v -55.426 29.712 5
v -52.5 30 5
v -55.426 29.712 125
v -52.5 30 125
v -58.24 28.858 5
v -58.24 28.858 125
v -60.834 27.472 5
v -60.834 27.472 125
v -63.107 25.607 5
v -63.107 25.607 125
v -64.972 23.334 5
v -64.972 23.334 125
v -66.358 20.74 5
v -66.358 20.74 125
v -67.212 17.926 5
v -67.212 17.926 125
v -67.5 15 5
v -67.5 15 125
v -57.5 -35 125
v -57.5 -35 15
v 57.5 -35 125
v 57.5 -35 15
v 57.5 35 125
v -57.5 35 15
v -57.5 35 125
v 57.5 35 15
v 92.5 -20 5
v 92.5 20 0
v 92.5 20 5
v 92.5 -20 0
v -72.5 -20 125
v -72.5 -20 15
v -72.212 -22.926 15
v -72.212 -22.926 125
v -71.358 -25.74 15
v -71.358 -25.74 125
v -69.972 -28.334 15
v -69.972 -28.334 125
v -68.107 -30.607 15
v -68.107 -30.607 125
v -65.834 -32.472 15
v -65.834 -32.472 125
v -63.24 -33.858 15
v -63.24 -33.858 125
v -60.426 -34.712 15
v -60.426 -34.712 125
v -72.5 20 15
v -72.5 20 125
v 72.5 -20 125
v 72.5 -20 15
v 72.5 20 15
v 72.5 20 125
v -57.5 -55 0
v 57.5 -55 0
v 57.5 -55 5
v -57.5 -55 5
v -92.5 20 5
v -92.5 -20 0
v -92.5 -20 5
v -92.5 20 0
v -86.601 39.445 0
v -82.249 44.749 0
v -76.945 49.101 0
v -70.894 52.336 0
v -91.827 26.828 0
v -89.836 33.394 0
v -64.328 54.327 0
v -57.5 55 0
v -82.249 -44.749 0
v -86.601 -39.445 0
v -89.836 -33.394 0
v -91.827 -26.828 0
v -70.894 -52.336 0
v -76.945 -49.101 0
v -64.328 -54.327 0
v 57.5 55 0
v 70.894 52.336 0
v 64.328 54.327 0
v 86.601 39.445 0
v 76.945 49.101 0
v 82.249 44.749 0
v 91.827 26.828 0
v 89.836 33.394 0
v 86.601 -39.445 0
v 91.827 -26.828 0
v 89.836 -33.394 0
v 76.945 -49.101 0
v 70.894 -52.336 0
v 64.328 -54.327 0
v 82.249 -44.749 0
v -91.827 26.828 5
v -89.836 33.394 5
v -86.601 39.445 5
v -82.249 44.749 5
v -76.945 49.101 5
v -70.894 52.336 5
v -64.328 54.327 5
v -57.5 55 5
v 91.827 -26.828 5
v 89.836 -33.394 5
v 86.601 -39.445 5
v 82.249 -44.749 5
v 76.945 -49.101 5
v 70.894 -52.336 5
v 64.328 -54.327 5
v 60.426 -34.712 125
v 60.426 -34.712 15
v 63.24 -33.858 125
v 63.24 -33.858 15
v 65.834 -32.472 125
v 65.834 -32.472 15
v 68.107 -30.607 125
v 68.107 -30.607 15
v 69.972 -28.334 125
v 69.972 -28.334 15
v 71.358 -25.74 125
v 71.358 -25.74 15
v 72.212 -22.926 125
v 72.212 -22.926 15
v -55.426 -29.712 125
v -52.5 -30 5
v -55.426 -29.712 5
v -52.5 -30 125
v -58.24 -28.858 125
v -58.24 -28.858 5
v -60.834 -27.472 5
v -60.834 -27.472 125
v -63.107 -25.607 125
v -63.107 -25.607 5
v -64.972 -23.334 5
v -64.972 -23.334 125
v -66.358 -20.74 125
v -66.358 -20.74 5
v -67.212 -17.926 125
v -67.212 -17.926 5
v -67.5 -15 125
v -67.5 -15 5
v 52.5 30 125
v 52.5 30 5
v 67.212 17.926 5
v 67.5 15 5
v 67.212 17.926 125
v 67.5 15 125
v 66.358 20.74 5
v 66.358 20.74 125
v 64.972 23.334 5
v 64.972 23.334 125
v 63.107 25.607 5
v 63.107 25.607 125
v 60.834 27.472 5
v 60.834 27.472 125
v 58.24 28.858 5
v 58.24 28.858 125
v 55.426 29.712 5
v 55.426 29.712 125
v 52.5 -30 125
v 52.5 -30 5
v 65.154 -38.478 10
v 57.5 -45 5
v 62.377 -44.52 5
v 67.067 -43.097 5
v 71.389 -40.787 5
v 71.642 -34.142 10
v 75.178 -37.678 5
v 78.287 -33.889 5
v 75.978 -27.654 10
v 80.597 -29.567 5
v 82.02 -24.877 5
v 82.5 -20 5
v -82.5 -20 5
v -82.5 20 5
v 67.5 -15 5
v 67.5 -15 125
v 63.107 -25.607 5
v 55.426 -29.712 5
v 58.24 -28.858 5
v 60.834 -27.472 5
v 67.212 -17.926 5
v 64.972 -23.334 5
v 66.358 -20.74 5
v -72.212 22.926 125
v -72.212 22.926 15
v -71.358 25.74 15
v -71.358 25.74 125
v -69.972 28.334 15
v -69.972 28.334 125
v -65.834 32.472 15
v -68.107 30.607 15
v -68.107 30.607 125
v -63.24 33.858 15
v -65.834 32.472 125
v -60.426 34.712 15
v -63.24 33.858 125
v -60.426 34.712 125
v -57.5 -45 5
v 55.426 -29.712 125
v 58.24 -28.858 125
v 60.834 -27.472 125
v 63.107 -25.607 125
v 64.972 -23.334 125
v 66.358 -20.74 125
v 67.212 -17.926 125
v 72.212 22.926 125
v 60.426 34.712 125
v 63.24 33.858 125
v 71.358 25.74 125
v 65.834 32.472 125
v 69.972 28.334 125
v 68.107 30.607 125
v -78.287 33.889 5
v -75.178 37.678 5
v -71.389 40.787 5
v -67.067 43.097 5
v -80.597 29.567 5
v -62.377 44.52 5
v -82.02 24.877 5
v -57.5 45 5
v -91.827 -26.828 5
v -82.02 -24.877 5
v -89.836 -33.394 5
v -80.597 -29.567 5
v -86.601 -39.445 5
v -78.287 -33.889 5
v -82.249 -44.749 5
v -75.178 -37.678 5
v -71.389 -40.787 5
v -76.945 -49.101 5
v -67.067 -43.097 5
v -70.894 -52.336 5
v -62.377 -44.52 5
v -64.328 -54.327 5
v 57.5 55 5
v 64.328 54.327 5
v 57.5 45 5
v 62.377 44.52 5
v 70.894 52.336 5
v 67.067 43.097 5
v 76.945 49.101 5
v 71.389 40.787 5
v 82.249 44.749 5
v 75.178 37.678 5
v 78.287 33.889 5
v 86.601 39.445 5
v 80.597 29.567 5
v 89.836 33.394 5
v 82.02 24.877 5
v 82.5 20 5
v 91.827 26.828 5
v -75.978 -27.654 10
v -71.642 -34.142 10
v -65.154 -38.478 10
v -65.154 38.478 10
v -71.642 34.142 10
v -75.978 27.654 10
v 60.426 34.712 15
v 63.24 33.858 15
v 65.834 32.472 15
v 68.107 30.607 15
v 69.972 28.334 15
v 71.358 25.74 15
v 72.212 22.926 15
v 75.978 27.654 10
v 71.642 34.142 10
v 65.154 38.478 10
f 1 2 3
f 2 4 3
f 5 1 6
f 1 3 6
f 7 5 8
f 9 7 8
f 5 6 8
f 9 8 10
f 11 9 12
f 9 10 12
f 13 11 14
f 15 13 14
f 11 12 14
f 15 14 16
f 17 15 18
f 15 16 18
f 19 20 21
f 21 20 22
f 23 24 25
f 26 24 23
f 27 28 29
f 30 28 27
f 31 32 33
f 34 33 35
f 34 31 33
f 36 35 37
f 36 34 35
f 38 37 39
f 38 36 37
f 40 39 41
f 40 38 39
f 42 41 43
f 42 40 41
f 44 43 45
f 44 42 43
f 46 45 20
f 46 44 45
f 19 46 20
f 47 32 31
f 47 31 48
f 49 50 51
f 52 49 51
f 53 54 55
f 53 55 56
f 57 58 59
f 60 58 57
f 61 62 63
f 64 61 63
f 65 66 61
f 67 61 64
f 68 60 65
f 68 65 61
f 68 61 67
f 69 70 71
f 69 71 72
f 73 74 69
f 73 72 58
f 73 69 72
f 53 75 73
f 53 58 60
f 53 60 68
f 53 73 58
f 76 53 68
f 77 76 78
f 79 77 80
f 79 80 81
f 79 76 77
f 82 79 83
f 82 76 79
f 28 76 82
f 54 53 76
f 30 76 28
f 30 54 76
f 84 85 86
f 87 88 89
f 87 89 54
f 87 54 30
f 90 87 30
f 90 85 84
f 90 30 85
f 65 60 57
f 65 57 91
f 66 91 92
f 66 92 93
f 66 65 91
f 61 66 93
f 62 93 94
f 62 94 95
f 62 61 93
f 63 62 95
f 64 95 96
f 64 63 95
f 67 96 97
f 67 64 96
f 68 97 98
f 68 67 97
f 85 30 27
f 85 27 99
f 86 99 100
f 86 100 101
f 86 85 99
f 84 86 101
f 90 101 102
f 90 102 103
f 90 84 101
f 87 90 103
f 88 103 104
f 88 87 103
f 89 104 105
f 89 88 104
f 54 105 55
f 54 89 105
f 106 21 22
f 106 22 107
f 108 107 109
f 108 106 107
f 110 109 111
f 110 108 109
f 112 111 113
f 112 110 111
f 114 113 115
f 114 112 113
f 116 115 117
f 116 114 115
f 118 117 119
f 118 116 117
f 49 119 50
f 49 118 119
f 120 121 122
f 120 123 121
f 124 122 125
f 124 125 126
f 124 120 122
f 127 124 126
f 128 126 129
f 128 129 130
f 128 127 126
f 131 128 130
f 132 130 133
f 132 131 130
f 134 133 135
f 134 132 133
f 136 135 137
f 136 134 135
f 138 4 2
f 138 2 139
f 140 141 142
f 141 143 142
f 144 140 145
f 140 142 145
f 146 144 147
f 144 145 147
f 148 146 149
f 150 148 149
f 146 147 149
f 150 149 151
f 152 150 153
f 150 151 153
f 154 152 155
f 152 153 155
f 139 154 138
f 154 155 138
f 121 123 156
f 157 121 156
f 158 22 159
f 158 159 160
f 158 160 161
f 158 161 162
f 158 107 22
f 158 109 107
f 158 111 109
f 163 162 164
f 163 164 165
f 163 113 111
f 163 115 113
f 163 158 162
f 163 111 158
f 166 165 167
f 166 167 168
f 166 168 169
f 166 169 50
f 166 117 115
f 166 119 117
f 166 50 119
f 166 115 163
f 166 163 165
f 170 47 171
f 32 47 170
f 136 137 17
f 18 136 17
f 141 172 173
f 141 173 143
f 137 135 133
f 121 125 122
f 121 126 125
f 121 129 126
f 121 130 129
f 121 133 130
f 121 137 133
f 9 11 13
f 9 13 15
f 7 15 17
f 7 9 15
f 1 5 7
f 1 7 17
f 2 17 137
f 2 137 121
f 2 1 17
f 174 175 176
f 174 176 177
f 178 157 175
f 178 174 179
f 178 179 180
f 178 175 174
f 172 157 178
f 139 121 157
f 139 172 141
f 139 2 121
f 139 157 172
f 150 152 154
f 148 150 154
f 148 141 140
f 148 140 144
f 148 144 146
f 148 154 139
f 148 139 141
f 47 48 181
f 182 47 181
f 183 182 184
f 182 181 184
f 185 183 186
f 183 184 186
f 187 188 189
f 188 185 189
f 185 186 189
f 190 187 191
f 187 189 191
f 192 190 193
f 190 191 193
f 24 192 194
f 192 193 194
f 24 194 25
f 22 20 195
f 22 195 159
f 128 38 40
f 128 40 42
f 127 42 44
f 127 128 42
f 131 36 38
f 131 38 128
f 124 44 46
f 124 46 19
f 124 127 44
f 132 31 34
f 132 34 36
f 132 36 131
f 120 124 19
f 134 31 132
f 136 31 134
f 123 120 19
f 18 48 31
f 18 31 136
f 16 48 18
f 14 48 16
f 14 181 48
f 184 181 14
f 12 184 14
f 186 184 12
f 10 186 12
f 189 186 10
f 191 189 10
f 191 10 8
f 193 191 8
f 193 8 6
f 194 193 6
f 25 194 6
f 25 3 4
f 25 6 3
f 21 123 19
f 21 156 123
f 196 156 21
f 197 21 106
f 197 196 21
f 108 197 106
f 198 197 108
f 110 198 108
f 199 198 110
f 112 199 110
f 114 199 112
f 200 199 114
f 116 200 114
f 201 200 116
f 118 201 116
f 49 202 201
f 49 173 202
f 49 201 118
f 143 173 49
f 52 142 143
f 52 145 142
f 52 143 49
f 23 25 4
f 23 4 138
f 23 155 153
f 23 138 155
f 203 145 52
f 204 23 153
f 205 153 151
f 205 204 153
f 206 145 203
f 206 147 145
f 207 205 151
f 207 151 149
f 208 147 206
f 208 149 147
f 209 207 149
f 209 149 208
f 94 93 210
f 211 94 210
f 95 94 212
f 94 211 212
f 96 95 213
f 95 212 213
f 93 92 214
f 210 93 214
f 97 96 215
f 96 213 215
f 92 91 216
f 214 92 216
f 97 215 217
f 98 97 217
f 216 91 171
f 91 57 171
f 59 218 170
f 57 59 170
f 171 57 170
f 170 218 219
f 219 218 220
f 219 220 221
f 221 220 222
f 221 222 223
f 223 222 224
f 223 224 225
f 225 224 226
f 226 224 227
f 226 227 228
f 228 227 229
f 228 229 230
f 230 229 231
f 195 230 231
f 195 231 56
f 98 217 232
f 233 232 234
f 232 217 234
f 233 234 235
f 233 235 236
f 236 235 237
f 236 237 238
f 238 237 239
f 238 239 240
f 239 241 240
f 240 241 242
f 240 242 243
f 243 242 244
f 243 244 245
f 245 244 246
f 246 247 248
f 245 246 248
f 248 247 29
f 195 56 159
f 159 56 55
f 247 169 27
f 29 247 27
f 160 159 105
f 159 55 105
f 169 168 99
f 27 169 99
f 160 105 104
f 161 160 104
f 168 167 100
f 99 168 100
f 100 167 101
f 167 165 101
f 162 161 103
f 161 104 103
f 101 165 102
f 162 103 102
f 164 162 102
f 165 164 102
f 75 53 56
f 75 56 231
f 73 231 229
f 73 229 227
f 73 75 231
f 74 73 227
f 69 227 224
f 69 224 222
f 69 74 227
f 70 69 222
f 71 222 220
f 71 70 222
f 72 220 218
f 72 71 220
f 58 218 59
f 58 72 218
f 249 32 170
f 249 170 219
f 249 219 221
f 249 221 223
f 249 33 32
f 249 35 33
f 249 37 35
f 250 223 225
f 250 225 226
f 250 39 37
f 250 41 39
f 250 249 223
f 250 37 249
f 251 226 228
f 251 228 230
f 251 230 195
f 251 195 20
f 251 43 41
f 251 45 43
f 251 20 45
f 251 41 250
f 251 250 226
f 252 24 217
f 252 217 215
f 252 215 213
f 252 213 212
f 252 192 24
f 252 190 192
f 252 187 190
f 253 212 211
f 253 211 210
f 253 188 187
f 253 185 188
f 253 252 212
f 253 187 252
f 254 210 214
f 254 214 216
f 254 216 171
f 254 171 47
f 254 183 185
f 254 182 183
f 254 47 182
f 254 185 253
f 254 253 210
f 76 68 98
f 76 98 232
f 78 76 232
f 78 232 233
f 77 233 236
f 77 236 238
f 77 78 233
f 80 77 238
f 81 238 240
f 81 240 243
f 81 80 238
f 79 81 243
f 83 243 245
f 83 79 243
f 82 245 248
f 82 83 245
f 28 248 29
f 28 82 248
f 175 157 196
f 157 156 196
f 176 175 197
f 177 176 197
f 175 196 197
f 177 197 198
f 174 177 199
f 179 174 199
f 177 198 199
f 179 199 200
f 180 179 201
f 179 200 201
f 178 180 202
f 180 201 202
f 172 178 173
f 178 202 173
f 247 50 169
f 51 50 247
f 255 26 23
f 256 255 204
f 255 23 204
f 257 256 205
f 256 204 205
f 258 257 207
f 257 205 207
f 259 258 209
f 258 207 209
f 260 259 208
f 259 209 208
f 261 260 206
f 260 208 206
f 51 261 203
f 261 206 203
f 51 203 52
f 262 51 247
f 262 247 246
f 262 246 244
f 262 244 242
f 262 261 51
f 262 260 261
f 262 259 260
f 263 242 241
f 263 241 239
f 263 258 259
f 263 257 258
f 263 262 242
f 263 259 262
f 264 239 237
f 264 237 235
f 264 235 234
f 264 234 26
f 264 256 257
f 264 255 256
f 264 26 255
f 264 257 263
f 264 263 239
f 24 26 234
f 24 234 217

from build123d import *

# Parameters (mm, degrees)
F0_W     = 145
F0_H     = 70
F0_W_2   = 135
F0_H_2   = 60
F1_DEPTH = 125
F2_DEPTH = 5
F3_R     = 15
F5_DEPTH = 5
F6_SIZE  = 10


with BuildPart() as f1:
    # F0 (on Top) → F1 (new body)
    with BuildSketch(Plane.XY):
        Rectangle(F0_W, F0_H)
        Rectangle(F0_W_2, F0_H_2, mode=Mode.SUBTRACT)
    extrude(amount=F1_DEPTH)

    # F0 (on Top) → F2 (join)
    with BuildSketch(Plane.XY):
        Rectangle(F0_W_2, F0_H_2)
    extrude(amount=F2_DEPTH)

    # F3
    f3_edges = [f1.edges().sort_by_distance(p)[0] for p in [
        (-72.5, 35, 62.5),
        (-67.5, 30, 65),
        (-67.5, -30, 65),
        (-72.5, -35, 62.5),
        (72.5, -35, 62.5),
        (67.5, -30, 65),
        (67.5, 30, 65),
        (72.5, 35, 62.5),
    ]]
    fillet(f3_edges, radius=F3_R)

    # F4 (on face) → F5 (join)
    with BuildSketch(Plane(origin=(0, 0, 0), x_dir=(1, 0, 0), z_dir=(0, 0, -1))):
        with BuildLine():
            Line((57.5, 55), (-57.5, 55))
            ThreePointArc((-57.5, 55), (-82.2487373415, 44.7487373415), (-92.5, 20))
            Line((-92.5, 20), (-92.5, -20))
            ThreePointArc((-92.5, -20), (-82.2487373415, -44.7487373415), (-57.5, -55))
            Line((-57.5, -55), (57.5, -55))
            ThreePointArc((57.5, -55), (82.2487373415, -44.7487373415), (92.5, -20))
            Line((92.5, -20), (92.5, 20))
            ThreePointArc((92.5, 20), (82.2487373415, 44.7487373415), (57.5, 55))
        make_face()
    extrude(amount=-F5_DEPTH)

    # F6
    f6_edges = [f1.edges().sort_by_distance(p)[0] for p in [
        (-68.106602, 30.606602, 5),
    ]]
    chamfer(f6_edges, length=F6_SIZE)


solid = f1.part
